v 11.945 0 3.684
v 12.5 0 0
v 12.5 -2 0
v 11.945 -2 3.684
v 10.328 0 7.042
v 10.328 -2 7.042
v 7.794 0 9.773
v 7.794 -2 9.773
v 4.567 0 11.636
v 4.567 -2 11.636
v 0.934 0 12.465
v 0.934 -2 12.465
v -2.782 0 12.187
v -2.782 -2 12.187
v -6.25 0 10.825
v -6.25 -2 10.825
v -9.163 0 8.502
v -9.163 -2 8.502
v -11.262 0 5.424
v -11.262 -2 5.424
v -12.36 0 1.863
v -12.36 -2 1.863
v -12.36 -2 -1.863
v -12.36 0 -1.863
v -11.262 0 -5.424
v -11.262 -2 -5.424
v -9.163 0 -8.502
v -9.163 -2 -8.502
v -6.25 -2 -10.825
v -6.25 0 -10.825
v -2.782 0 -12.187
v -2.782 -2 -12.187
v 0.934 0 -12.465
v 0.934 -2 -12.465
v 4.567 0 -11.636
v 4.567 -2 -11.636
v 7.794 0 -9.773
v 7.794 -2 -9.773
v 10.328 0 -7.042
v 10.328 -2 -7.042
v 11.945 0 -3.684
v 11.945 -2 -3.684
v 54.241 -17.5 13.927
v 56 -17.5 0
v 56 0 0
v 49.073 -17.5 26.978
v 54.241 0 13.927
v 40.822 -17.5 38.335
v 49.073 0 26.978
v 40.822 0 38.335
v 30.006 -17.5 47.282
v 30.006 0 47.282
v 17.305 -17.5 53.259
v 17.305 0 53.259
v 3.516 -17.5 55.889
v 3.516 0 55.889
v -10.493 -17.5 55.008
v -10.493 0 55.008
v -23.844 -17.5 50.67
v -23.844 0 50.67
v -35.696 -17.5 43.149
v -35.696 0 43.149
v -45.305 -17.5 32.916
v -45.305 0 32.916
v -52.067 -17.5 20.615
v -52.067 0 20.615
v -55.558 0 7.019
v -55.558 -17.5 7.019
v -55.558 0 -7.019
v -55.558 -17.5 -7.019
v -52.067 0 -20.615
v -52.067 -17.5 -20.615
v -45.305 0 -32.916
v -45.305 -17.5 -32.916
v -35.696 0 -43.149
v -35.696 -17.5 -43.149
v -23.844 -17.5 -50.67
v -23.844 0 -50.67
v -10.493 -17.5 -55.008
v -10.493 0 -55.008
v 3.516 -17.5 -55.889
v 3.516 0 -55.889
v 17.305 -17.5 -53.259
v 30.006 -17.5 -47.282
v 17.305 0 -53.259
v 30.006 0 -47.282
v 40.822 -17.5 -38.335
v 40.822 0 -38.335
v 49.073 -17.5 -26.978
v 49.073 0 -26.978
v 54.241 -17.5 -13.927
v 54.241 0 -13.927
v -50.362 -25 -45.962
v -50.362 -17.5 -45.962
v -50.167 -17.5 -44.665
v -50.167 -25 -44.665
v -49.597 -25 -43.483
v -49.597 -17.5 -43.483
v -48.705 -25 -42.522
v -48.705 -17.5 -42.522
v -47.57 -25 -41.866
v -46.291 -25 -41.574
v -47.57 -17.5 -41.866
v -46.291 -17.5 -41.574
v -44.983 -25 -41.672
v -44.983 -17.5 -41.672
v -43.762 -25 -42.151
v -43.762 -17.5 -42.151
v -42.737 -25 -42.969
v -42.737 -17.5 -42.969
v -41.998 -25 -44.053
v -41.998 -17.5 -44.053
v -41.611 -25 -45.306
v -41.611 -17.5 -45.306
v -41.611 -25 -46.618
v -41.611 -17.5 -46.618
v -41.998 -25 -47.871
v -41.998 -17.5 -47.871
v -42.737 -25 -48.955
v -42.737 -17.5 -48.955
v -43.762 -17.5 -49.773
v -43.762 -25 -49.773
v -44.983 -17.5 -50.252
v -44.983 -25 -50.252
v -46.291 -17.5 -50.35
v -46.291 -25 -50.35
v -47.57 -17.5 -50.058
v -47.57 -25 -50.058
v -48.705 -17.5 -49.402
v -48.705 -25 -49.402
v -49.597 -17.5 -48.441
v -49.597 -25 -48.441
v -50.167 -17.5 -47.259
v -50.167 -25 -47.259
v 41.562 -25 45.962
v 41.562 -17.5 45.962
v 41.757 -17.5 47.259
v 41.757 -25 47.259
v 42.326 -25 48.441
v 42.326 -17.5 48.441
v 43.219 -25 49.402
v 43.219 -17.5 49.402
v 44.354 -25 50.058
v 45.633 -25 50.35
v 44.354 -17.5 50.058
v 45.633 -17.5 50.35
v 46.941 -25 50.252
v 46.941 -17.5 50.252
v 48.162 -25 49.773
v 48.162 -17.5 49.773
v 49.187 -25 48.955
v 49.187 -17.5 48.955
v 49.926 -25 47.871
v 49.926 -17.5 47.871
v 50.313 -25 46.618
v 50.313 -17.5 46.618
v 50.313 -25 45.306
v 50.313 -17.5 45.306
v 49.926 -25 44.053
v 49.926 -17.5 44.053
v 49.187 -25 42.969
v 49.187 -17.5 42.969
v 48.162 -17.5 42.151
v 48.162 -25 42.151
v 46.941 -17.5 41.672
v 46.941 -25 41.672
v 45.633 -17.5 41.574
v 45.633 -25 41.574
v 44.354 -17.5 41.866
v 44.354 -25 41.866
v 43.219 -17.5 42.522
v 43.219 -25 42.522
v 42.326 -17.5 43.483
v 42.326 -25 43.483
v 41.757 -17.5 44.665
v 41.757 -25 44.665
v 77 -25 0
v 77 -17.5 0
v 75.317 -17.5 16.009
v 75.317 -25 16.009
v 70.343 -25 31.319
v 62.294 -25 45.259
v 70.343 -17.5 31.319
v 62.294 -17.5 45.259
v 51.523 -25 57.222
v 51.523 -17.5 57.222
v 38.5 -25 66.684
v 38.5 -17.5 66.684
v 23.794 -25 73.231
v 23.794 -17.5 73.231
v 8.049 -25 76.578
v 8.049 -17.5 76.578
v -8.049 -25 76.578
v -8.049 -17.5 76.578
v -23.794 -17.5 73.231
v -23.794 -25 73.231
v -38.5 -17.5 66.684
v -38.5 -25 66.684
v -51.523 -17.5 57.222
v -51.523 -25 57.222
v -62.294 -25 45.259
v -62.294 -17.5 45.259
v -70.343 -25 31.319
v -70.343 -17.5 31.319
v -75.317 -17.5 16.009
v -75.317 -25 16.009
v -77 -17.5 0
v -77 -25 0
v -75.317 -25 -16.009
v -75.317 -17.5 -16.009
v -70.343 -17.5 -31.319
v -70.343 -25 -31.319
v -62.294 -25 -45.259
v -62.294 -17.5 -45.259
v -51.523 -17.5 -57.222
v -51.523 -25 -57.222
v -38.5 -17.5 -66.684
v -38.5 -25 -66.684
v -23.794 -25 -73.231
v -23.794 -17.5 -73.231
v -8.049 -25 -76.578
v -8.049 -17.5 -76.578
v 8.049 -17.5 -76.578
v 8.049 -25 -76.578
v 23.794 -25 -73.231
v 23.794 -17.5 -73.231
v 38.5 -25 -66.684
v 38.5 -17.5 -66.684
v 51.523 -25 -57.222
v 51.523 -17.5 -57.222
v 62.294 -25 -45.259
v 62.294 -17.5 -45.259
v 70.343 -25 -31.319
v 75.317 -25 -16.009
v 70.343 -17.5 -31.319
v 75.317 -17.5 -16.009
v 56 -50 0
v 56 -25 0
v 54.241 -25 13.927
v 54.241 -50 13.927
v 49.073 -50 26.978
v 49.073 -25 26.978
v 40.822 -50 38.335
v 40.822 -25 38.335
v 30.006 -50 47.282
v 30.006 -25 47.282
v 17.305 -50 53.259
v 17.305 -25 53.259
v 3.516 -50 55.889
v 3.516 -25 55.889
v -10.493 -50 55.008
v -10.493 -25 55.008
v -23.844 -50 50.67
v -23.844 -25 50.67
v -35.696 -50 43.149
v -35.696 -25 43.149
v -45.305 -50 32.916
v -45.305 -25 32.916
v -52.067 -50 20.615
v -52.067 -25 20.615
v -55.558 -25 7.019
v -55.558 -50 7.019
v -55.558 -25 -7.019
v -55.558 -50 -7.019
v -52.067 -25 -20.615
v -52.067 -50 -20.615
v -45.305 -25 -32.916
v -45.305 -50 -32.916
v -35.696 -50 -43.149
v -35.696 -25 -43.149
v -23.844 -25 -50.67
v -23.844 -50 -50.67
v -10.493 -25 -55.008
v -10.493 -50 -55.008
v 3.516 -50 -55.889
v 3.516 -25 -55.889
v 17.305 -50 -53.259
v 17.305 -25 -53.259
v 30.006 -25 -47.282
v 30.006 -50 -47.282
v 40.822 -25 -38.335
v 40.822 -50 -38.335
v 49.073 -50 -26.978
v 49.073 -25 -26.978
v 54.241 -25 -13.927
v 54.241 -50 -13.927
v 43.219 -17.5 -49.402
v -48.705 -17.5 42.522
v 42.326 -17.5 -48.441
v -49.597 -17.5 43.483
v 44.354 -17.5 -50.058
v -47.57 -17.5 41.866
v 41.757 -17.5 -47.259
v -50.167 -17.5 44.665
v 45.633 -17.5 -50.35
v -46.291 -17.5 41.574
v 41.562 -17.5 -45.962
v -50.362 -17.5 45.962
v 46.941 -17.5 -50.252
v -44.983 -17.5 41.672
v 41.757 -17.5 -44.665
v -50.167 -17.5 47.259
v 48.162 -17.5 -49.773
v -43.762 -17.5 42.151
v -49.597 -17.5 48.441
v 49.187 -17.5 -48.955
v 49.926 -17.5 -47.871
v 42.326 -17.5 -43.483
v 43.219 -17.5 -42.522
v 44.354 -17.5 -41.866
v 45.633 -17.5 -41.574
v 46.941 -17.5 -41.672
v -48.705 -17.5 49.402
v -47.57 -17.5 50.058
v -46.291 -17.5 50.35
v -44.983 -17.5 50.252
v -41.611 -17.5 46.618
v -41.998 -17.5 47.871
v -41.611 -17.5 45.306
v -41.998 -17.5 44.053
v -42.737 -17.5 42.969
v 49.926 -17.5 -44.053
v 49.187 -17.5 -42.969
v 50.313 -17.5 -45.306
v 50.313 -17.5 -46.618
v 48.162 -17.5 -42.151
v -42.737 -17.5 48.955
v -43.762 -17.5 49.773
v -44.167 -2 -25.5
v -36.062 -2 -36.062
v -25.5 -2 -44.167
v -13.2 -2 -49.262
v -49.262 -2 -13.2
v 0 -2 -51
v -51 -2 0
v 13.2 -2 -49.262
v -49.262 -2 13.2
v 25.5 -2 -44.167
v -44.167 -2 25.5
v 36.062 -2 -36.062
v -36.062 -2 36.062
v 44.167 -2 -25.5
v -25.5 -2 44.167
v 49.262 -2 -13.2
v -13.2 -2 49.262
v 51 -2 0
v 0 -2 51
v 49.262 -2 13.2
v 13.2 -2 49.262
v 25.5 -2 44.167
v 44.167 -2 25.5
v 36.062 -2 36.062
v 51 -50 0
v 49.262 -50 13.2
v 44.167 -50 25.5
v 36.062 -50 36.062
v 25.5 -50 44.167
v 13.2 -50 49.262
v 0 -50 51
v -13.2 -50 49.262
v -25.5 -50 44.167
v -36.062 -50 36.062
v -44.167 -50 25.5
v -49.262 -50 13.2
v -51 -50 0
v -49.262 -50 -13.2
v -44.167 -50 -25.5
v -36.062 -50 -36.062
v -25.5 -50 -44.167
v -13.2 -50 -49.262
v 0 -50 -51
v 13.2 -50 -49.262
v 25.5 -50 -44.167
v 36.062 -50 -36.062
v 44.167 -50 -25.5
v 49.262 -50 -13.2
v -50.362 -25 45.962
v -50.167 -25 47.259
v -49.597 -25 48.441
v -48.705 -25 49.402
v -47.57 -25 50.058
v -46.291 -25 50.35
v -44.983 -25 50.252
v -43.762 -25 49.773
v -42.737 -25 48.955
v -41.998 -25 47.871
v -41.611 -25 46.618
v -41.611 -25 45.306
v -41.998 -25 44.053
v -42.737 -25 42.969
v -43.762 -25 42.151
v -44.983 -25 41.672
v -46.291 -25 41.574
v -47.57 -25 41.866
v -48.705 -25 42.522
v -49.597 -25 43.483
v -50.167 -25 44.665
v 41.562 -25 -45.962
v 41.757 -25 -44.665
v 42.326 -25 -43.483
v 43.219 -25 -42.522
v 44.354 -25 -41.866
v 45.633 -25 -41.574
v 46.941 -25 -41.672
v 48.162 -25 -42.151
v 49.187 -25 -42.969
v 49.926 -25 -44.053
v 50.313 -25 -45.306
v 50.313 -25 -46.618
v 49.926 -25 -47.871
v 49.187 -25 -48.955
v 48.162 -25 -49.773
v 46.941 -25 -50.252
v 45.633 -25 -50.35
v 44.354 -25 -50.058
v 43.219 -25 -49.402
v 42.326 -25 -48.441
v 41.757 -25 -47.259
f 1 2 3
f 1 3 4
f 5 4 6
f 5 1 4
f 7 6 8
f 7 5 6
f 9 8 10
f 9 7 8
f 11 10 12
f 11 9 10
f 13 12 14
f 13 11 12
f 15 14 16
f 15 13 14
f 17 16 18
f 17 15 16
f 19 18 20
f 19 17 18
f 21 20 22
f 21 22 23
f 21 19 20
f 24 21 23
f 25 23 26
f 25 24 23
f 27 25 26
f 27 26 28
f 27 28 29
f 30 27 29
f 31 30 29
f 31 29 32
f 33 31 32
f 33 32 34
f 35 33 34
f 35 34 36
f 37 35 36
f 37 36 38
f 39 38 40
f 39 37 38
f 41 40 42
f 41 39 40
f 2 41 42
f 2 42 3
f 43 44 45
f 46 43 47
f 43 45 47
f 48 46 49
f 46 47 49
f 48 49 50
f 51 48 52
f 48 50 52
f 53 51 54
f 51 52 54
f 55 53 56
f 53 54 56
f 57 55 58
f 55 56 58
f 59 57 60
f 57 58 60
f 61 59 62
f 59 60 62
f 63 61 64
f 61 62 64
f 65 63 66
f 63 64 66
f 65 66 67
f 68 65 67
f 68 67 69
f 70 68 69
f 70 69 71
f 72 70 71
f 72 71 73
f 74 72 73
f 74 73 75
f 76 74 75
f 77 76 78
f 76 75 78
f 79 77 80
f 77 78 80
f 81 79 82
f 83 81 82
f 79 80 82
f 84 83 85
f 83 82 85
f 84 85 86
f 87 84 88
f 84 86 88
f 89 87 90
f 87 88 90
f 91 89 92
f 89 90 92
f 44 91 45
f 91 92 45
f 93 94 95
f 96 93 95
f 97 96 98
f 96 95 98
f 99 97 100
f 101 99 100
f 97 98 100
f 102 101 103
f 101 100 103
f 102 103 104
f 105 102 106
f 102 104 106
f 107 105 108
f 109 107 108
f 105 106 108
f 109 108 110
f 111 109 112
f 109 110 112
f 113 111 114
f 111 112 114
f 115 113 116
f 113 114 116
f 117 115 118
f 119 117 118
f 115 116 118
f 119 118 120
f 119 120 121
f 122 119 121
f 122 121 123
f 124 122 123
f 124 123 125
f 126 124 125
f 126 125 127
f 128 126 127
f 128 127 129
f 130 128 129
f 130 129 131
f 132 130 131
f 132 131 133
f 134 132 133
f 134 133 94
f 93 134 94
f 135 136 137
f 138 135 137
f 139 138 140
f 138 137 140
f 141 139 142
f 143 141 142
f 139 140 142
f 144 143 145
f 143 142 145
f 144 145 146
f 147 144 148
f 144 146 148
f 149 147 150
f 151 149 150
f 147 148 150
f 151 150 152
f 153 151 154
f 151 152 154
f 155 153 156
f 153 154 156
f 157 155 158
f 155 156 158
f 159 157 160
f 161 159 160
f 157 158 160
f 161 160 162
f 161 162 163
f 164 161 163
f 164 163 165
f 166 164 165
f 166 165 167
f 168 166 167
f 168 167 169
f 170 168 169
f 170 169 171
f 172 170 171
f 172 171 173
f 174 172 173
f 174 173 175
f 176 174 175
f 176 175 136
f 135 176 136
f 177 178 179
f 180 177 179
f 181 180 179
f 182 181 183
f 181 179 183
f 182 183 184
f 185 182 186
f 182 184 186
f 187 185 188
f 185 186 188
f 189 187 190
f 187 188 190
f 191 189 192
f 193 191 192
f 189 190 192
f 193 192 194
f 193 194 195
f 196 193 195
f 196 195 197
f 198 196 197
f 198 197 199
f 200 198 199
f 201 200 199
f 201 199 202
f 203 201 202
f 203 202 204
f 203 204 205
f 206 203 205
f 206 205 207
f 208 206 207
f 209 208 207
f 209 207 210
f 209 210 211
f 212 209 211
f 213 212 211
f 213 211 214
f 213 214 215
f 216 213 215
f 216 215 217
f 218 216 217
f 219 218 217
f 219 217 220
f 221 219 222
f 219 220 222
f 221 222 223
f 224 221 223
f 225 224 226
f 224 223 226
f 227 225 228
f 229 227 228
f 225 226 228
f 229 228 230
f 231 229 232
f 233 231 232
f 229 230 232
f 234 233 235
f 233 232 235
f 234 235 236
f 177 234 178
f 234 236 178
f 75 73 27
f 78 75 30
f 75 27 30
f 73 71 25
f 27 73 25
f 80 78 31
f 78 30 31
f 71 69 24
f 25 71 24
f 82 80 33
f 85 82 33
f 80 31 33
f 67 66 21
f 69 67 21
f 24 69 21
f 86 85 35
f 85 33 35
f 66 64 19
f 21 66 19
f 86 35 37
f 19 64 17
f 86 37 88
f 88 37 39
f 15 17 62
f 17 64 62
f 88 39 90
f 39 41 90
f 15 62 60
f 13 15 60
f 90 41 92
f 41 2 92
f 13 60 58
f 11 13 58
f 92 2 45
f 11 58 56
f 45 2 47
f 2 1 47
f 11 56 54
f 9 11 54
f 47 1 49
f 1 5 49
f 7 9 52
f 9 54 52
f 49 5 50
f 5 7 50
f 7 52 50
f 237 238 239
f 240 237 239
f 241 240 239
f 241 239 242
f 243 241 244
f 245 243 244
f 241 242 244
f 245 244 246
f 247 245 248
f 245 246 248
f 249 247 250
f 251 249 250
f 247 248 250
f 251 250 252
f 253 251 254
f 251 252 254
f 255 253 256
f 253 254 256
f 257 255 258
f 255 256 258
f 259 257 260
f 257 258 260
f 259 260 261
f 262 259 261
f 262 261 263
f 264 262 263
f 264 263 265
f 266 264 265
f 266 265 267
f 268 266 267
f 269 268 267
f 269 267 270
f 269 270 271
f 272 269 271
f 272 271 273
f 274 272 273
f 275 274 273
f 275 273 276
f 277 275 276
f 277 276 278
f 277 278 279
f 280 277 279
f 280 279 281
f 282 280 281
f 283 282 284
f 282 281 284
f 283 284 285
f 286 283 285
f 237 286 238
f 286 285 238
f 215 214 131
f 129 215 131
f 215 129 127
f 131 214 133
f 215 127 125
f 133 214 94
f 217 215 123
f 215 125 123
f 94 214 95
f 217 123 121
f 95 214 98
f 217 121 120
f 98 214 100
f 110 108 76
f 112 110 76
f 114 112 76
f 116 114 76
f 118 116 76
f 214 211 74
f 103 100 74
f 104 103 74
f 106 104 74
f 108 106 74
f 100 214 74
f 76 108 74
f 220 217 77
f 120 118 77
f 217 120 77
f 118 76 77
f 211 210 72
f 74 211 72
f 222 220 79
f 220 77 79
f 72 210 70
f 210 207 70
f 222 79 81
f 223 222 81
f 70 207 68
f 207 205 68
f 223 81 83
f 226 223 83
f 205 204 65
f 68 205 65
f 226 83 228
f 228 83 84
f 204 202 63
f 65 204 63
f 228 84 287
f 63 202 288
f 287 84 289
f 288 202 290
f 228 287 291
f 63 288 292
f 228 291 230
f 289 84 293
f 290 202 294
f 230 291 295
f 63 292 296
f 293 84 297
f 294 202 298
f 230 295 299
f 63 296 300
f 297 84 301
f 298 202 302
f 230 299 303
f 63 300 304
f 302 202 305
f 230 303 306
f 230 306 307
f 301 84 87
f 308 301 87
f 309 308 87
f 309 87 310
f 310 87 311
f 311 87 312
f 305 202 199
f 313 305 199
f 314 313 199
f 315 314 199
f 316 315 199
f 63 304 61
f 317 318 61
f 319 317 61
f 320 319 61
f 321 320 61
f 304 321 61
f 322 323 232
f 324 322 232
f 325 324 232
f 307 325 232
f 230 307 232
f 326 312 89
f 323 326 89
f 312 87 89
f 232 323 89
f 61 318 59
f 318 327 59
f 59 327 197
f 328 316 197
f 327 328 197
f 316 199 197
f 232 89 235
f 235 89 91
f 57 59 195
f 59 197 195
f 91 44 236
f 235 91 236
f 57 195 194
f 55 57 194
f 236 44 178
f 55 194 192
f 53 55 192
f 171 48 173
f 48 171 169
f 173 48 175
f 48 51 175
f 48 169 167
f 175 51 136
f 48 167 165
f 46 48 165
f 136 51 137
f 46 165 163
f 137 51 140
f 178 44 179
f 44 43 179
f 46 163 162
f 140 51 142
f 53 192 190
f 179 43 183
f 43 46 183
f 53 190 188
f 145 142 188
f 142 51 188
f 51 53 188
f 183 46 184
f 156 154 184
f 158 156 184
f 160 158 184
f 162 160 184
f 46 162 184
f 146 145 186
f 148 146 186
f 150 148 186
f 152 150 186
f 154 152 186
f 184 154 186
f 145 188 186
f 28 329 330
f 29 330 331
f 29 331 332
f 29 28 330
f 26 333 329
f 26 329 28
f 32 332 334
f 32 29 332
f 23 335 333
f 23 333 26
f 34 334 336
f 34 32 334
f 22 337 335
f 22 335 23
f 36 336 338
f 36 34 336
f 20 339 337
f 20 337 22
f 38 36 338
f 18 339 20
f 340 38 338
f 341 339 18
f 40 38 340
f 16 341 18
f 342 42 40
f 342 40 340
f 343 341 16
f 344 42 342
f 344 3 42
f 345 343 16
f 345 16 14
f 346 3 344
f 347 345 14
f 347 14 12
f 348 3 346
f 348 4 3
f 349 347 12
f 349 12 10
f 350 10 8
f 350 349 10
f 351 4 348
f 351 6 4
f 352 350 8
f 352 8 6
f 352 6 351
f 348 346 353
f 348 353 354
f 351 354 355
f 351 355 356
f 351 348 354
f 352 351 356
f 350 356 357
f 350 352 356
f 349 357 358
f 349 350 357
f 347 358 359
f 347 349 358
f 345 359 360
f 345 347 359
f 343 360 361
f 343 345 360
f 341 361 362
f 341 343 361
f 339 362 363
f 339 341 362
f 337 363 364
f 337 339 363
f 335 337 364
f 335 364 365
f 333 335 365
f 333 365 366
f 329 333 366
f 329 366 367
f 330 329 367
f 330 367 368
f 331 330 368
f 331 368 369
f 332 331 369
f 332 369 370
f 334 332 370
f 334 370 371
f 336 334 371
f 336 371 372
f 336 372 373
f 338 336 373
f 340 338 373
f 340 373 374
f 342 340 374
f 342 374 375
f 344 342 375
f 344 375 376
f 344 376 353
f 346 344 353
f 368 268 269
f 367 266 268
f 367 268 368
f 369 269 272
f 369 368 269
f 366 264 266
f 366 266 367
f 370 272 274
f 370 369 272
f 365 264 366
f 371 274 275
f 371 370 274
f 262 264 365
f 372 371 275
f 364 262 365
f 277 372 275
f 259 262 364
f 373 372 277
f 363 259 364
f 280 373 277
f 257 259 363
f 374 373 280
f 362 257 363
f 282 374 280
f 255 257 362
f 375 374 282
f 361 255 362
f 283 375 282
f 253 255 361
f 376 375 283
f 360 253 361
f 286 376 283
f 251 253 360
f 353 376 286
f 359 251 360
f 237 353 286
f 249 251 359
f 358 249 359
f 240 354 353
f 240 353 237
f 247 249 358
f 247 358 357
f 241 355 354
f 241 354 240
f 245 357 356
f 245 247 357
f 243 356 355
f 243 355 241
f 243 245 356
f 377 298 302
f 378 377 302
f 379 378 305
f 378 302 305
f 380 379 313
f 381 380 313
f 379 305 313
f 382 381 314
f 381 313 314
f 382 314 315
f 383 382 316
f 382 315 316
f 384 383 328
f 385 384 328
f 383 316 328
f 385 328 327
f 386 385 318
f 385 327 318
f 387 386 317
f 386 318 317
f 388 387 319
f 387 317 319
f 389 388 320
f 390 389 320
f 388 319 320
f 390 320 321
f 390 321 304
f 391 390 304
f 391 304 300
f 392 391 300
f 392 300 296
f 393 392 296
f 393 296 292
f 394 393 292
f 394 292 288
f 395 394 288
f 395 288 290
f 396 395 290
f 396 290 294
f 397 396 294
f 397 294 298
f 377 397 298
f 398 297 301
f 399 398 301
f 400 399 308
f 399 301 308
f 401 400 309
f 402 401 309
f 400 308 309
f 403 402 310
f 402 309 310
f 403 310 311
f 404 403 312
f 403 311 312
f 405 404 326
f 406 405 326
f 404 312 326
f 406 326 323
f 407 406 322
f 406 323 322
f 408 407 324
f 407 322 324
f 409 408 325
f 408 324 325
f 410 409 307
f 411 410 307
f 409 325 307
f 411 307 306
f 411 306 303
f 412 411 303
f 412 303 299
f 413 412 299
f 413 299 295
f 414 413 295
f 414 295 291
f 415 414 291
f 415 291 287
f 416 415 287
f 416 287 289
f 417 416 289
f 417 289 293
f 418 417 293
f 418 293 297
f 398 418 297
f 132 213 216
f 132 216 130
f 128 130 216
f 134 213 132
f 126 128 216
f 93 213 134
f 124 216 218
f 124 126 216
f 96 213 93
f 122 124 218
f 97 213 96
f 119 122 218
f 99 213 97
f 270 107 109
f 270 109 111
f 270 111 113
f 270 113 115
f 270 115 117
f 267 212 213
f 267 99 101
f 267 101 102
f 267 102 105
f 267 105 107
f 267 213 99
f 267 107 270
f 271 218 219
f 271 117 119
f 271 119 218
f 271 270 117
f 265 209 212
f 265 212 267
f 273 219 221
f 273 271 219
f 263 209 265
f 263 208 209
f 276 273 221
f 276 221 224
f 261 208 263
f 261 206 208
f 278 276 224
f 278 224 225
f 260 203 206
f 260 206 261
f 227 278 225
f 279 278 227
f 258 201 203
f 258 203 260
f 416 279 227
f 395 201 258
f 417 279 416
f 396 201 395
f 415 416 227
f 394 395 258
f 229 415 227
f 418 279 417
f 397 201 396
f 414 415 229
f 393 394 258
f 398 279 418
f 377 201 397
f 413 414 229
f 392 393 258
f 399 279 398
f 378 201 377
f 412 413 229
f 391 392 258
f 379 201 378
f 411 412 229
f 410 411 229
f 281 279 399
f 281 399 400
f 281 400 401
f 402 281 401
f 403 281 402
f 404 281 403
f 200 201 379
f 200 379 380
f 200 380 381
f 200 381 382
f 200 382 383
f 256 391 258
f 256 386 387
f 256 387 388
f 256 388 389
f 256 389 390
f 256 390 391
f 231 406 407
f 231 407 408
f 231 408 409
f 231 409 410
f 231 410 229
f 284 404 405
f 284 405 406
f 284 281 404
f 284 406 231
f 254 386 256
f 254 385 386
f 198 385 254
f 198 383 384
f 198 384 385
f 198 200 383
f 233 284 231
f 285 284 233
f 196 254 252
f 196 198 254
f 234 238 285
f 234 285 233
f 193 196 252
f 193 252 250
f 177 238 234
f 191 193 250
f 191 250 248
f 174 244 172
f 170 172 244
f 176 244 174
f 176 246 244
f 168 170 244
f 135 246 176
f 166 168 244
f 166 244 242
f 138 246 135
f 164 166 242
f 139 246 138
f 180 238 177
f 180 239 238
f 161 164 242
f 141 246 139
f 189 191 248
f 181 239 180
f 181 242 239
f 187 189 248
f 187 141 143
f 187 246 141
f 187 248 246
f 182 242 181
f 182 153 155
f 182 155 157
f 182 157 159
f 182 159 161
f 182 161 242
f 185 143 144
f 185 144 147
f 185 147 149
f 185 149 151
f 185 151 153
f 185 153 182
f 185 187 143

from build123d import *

# Parameters (mm, degrees)
F0_R     = 56
F0_R_2   = 51
F1_DEPTH = 50
F0_R_3   = 77
F2_DEPTH = 25
F3_DEPTH = 17.5
F5_D     = 8.8
F6_R     = 51
F6_R_2   = 12.5
F7_DEPTH = 2


with BuildPart() as f1:
    # F0 (on Front) → F1 (new body)
    with BuildSketch(Plane.XZ):
        Circle(F0_R)
        Circle(F0_R_2, mode=Mode.SUBTRACT)
    extrude(amount=F1_DEPTH)

    # F0 (on Front) → F2 (join)
    with BuildSketch(Plane.XZ):
        Circle(F0_R_3)
        Circle(F0_R, mode=Mode.SUBTRACT)
    extrude(amount=F2_DEPTH)

    # F0 (on Front) → F3 (cut)
    with BuildSketch(Plane.XZ):
        Circle(F0_R_3)
        Circle(F0_R, mode=Mode.SUBTRACT)
    extrude(amount=F3_DEPTH, mode=Mode.SUBTRACT)

    # F5 (through all)
    with Locations(Plane.XZ.offset(25)):
        with Locations((-45.962, 45.962), (45.9618815542, 45.962), (45.9618815542, -45.962), (-45.962, -45.962)):
            Hole(F5_D / 2)

    # F6 (on Front) → F7 (join)
    with BuildSketch(Plane.XZ):
        Circle(F6_R)
        Circle(F6_R_2, mode=Mode.SUBTRACT)
    extrude(amount=F7_DEPTH)


solid = f1.part
